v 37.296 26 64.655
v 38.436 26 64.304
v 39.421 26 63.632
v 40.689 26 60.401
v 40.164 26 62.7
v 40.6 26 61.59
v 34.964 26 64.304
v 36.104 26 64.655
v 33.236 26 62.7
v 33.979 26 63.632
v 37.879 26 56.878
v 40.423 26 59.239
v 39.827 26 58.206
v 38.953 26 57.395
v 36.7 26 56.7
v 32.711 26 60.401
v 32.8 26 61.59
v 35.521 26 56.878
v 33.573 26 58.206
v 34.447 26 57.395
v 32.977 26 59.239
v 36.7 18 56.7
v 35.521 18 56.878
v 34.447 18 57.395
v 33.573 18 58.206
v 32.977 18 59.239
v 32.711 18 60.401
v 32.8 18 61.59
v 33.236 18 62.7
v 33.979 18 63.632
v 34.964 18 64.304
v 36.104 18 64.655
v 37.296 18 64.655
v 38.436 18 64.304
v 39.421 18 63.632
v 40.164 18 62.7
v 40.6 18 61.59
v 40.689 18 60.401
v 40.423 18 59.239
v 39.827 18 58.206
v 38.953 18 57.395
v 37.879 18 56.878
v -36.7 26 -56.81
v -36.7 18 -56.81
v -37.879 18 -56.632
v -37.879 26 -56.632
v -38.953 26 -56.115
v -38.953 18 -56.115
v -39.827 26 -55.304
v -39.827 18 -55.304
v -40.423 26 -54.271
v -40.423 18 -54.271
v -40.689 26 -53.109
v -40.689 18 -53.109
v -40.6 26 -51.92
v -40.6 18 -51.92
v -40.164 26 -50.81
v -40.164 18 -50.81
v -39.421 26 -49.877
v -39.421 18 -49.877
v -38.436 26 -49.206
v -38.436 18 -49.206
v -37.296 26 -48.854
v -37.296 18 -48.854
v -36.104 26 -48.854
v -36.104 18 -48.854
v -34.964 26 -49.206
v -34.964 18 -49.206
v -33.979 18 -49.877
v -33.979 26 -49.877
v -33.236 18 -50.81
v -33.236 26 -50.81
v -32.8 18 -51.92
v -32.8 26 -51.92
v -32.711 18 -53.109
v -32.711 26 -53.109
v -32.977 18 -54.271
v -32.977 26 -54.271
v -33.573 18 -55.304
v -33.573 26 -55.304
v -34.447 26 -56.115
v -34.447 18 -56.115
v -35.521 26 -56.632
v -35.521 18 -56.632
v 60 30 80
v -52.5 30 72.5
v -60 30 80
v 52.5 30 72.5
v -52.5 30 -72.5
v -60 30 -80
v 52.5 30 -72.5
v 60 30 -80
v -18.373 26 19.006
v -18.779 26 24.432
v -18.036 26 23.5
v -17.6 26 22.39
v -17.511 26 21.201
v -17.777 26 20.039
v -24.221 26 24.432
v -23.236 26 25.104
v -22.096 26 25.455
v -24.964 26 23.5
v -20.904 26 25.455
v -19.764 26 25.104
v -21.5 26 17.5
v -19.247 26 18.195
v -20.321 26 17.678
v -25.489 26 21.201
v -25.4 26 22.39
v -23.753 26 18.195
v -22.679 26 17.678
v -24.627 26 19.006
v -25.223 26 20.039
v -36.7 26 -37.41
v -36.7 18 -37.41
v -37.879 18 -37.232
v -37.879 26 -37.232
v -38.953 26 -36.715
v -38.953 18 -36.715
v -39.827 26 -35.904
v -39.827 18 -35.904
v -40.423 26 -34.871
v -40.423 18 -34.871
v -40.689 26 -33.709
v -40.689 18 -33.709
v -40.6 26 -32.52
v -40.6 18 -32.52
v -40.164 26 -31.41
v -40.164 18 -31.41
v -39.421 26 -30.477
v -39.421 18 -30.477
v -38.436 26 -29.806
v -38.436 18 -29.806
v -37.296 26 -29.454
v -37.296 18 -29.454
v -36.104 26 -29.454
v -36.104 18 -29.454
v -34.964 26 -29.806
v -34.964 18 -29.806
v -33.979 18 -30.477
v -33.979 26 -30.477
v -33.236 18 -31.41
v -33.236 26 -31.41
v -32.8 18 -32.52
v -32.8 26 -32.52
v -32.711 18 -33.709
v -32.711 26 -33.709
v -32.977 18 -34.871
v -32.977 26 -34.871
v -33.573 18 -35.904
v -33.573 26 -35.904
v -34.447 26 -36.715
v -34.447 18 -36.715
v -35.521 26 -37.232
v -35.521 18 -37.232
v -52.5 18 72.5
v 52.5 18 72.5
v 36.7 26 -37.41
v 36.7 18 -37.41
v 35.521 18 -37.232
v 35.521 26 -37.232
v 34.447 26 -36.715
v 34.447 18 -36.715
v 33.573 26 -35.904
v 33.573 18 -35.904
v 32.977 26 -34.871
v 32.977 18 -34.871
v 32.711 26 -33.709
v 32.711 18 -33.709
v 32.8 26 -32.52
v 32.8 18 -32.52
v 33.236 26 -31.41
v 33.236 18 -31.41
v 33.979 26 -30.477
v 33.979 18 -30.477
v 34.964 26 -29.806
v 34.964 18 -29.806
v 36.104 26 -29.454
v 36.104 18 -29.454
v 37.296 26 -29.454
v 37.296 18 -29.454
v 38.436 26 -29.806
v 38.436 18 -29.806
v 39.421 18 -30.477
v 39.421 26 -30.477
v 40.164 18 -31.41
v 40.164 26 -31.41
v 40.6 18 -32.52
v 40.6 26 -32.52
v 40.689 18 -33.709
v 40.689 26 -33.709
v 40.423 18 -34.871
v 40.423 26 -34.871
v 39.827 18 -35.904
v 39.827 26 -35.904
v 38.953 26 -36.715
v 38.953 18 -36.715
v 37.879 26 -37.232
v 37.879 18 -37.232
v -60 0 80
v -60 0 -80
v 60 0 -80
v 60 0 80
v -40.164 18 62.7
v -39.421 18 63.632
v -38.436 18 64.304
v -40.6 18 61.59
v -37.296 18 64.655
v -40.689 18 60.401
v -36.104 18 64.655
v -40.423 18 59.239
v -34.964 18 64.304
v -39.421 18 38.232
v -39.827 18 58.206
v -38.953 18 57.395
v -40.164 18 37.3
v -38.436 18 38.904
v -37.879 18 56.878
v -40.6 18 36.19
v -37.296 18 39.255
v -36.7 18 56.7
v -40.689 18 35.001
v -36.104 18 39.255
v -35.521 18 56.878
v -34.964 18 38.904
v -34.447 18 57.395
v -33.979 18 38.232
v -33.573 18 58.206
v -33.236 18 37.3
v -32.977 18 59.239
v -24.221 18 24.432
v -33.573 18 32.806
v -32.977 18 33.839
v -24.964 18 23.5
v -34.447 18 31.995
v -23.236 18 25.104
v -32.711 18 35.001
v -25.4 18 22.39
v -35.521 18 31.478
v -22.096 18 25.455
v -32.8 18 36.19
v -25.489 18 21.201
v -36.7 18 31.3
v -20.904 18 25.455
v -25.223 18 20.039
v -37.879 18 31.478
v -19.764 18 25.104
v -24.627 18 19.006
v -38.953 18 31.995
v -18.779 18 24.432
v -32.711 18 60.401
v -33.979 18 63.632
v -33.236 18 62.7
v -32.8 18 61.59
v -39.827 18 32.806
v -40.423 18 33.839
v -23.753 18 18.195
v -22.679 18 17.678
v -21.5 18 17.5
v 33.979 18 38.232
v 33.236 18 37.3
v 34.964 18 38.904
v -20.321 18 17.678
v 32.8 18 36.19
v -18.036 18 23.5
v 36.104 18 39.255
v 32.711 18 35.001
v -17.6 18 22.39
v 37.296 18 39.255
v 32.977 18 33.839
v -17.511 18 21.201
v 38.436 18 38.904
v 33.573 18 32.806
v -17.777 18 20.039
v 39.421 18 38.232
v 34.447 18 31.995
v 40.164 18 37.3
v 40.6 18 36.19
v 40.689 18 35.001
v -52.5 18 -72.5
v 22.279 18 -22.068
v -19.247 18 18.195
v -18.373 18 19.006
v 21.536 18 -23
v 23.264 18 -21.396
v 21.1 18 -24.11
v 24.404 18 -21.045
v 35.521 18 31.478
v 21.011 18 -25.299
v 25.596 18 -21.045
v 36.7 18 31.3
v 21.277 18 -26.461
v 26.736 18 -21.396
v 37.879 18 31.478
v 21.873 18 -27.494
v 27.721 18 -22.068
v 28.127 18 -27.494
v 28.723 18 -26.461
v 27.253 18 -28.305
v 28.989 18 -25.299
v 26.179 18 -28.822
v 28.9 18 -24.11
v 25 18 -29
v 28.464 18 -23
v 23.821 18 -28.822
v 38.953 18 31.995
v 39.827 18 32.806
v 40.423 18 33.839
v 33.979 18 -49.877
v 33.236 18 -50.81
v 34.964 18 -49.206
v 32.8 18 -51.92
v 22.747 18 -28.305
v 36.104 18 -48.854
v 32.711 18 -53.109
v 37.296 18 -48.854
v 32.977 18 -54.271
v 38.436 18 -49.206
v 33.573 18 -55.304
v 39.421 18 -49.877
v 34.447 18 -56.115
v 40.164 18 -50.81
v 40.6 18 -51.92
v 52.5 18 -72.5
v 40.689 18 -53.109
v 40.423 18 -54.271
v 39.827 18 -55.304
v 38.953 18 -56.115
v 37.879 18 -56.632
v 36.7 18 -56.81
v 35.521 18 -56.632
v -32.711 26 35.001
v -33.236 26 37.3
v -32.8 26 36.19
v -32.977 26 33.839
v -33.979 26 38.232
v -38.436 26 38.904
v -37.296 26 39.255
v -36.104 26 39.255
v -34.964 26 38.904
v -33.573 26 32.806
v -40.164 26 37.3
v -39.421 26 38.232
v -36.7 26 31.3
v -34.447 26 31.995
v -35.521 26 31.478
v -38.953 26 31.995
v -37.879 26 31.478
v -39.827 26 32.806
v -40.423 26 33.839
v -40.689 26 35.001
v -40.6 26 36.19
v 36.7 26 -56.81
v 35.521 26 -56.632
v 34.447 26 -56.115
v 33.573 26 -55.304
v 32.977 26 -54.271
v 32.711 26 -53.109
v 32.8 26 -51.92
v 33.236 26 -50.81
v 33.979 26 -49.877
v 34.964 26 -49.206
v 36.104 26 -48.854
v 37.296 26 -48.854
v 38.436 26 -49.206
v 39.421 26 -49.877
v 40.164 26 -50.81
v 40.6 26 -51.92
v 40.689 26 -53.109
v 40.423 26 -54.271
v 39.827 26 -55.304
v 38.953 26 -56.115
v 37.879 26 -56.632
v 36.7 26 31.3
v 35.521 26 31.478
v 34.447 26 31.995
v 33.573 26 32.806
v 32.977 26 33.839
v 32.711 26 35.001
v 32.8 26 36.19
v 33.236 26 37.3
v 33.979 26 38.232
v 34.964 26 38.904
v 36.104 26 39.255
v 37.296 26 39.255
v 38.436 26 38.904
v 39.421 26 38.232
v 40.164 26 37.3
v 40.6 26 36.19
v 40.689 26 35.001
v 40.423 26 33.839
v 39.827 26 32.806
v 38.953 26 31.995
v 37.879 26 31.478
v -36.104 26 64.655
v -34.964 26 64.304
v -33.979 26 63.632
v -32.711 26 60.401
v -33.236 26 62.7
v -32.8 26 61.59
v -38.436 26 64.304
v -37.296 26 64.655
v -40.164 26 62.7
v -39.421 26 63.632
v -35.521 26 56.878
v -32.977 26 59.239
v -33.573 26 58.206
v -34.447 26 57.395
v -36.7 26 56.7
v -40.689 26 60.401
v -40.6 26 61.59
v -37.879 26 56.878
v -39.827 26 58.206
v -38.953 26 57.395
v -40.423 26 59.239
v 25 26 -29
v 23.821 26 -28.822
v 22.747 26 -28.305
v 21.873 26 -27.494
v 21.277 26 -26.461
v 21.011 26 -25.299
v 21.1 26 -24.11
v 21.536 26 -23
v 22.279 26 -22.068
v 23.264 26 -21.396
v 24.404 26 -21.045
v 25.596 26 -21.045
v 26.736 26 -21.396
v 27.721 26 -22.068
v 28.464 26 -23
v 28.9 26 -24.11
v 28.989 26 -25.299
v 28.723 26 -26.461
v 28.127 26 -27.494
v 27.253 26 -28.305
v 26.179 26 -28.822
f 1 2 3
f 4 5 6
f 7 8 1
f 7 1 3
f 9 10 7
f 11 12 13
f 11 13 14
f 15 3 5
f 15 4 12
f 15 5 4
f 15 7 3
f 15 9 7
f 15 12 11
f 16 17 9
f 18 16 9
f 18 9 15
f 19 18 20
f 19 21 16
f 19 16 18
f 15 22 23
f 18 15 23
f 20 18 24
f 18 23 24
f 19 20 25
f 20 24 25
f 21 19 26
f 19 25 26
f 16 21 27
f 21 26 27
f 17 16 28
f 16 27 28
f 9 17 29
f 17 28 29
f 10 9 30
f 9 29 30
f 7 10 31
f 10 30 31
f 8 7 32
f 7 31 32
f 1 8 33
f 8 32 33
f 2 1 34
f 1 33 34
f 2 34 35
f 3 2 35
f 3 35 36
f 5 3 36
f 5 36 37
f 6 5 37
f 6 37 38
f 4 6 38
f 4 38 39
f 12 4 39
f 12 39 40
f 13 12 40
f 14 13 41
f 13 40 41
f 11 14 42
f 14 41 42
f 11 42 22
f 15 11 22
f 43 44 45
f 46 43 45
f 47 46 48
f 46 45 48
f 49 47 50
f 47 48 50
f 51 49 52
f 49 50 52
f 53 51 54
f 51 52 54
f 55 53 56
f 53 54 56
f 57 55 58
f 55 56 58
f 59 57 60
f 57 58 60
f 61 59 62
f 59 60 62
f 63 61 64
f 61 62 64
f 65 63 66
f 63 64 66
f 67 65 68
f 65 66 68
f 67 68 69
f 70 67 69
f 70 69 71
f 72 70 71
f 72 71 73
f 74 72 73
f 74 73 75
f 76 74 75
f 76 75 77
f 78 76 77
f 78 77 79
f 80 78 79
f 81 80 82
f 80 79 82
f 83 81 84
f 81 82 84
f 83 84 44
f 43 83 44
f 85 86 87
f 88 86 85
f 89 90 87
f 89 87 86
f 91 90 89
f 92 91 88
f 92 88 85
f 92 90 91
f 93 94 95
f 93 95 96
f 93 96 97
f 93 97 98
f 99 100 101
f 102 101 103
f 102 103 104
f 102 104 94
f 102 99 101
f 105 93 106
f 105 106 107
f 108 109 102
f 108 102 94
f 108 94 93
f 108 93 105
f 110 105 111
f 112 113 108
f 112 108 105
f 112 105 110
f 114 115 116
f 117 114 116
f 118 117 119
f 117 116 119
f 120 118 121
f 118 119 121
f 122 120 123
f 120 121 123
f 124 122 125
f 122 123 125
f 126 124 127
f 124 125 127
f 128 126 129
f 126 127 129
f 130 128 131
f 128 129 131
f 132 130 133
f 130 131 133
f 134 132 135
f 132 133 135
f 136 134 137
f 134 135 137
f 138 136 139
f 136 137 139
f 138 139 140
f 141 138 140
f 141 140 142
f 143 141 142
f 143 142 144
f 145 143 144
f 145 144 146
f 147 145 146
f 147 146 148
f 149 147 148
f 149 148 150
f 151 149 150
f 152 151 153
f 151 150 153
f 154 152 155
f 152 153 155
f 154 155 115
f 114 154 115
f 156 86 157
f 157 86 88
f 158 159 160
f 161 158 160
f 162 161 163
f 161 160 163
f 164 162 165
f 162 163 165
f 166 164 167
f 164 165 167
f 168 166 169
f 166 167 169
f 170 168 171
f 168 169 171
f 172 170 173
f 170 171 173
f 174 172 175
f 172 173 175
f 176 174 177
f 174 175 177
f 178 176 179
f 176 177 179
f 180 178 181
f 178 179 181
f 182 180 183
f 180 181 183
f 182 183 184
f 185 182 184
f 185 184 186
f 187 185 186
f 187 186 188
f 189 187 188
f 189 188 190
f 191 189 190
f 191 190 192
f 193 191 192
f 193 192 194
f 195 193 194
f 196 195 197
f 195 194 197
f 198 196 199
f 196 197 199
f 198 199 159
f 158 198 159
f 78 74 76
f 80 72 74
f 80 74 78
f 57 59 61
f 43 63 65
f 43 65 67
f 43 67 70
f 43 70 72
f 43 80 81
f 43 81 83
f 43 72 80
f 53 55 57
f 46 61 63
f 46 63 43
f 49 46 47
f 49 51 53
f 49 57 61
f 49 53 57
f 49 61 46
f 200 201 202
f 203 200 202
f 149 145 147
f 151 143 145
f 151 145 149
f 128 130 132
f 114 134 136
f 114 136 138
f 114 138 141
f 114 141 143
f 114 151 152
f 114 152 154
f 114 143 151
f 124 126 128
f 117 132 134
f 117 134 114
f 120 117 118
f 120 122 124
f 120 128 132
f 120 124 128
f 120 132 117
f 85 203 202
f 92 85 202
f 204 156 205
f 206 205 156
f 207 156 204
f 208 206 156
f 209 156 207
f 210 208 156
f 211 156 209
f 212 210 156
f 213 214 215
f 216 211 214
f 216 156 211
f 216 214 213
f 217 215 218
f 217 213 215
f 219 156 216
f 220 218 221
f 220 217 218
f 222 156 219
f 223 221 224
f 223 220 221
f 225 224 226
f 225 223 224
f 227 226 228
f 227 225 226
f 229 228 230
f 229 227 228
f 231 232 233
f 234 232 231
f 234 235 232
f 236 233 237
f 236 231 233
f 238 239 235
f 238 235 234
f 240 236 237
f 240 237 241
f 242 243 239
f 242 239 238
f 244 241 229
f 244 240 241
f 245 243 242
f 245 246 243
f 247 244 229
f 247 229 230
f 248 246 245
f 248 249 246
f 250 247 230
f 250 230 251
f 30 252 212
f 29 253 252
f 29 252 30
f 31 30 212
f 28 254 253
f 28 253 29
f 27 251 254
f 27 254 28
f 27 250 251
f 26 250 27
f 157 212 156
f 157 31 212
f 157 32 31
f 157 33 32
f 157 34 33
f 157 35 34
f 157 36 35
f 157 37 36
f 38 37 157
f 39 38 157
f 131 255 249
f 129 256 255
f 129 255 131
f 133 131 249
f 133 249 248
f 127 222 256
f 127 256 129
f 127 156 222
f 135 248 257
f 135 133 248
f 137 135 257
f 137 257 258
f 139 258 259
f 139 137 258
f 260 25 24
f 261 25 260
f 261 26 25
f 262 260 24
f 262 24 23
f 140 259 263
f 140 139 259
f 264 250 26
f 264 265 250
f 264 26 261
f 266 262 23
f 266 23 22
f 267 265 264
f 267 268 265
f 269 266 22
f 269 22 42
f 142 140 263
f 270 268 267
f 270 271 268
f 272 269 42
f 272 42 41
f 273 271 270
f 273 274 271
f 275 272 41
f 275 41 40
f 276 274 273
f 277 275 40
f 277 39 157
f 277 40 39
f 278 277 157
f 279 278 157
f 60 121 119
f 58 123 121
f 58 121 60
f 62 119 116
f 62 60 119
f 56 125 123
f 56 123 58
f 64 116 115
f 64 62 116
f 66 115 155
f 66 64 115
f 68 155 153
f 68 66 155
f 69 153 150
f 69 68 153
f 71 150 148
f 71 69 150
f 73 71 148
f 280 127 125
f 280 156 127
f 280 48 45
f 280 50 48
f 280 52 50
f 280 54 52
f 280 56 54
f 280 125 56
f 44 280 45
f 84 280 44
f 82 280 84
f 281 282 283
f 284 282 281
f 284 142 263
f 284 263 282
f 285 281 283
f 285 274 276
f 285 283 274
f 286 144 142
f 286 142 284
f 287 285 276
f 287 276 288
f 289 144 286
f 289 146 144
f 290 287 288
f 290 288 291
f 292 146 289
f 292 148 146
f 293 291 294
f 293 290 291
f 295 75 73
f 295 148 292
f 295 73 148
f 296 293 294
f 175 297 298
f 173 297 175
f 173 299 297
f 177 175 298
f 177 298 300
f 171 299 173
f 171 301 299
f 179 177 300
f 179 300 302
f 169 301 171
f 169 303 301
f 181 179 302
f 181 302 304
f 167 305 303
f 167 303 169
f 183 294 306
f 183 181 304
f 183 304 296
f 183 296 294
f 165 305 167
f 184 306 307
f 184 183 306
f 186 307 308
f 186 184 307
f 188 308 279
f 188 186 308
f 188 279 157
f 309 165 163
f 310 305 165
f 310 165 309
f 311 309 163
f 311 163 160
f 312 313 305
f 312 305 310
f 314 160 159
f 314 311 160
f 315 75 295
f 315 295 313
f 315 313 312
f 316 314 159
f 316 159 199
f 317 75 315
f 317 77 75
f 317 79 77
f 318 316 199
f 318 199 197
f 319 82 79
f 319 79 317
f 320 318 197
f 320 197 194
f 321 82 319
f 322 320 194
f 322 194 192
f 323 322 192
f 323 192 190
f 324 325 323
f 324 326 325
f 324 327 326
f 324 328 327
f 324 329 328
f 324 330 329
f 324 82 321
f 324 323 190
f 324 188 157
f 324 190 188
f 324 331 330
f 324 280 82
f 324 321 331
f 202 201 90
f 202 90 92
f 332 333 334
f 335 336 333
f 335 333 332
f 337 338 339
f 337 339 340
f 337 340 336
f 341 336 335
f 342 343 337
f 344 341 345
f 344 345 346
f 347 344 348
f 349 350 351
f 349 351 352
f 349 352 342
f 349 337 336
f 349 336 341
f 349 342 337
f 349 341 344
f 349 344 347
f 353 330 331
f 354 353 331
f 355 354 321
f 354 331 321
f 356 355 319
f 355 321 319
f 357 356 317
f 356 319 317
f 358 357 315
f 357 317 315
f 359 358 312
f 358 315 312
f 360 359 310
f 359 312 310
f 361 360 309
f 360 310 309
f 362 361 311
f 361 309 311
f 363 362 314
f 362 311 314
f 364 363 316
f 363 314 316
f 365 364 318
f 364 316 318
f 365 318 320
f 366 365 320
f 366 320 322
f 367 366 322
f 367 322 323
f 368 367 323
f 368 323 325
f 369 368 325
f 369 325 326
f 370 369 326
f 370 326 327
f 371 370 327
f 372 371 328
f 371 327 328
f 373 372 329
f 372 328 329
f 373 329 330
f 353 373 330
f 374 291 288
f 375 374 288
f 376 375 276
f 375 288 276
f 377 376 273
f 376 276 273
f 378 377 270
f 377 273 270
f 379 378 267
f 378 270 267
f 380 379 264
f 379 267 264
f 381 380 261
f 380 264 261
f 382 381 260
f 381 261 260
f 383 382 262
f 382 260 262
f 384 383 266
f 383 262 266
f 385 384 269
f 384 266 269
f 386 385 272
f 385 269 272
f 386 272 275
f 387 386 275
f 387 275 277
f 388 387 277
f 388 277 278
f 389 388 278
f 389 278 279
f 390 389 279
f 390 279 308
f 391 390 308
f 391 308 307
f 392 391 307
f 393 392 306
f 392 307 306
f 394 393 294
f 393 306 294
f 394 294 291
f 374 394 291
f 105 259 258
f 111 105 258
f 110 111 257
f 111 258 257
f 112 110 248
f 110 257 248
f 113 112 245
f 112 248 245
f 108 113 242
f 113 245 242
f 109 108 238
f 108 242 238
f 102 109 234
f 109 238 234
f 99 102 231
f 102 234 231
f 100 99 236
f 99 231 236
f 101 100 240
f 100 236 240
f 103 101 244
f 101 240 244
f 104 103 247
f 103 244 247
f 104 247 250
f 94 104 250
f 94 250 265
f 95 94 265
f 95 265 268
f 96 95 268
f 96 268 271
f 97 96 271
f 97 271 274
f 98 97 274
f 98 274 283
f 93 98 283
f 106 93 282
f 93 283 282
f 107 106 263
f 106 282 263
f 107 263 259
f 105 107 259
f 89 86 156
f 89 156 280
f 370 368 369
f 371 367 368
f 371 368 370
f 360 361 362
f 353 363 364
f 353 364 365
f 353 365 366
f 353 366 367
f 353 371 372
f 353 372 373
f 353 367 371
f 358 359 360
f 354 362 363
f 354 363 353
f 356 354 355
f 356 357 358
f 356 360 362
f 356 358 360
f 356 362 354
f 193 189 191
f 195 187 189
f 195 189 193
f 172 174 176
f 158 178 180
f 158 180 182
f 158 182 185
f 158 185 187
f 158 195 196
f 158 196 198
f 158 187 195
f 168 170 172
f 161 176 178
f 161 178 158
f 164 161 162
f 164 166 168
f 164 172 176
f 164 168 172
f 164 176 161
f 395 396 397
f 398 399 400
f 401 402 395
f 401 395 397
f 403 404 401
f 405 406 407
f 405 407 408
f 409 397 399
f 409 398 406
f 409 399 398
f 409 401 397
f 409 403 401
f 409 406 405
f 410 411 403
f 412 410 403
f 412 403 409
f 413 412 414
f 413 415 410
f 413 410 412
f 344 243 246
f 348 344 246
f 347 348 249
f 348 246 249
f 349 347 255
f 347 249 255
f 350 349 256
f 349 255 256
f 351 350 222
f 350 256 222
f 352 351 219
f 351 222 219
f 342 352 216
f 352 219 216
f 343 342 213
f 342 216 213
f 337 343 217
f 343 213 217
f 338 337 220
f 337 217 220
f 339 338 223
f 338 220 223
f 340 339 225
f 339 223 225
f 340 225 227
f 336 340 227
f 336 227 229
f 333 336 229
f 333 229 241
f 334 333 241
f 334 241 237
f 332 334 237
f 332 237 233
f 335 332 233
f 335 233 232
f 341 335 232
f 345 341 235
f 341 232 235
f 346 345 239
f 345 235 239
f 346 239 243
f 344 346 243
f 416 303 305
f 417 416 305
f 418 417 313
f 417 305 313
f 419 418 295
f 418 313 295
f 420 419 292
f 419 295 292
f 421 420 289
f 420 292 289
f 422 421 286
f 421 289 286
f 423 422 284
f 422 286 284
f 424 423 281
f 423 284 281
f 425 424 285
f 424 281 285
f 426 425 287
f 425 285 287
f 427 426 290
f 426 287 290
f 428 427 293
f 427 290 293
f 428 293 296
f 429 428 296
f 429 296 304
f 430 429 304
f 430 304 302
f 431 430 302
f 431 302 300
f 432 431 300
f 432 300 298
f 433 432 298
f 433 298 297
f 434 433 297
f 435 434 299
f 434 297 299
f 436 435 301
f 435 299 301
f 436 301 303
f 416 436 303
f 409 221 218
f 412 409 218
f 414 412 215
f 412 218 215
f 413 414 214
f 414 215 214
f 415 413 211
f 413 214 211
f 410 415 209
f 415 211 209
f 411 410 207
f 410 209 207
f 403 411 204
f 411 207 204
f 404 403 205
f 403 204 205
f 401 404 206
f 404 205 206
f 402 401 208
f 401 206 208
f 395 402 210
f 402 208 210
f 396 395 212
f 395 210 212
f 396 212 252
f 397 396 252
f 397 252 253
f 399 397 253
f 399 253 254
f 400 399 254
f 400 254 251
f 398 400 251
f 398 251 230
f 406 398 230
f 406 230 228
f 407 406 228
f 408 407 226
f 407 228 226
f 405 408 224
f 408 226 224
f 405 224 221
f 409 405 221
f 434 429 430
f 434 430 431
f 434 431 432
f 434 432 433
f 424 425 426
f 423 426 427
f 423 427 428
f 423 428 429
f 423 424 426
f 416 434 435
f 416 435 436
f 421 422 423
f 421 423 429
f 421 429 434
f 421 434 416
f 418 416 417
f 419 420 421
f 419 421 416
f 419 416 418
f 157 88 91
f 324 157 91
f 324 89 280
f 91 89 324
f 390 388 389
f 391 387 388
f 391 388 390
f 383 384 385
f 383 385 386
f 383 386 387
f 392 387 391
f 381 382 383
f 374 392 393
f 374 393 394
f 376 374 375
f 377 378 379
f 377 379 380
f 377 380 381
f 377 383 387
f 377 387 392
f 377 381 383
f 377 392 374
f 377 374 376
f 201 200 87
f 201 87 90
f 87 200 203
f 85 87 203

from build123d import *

# Parameters (mm, degrees)
SKETCH1_W           = 120
SKETCH1_H           = 160
BOSS_EXTRUDE1_DEPTH = 30
SKETCH2_W           = 105
SKETCH2_H           = 145
CUT_EXTRUDE1_DEPTH  = 12
SKETCH3_R           = 4
BOSS_EXTRUDE2_DEPTH = 8


with BuildPart() as part:
    # Sketch1 → Boss-Extrude1 (new body)
    with BuildSketch(Plane(origin=(0, 0, 0), x_dir=(1, 0, 0), z_dir=(0, 1, 0))):
        Rectangle(SKETCH1_W, SKETCH1_H)
    extrude(amount=BOSS_EXTRUDE1_DEPTH)

    # Sketch2 → Cut-Extrude1 (cut)
    with BuildSketch(Plane(origin=(0, 30, 0), x_dir=(1, 0, 0), z_dir=(0, 1, 0))):
        Rectangle(SKETCH2_W, SKETCH2_H)
    extrude(amount=-CUT_EXTRUDE1_DEPTH, mode=Mode.SUBTRACT)

    # Sketch3 → Boss-Extrude2 (add)
    with BuildSketch(Plane(origin=(0, 18, 0), x_dir=(1, 0, 0), z_dir=(0, 1, 0))):
        with Locations(Location((-21.5, -21.5, 0), (0, 0, 90))):
            Circle(SKETCH3_R)
        with Locations(Location((25, 25, 0), (0, 0, 90))):
            Circle(SKETCH3_R)
        with Locations(Location((-36.7, -35.3, 0), (0, 0, 90))):
            Circle(SKETCH3_R)
        with Locations(Location((36.7, -35.3, 0), (0, 0, 90))):
            Circle(SKETCH3_R)
        with Locations(Location((36.7, -60.7, 0), (0, 0, 90))):
            Circle(SKETCH3_R)
        with Locations(Location((-36.7, -60.7, 0), (0, 0, 90))):
            Circle(SKETCH3_R)
        with Locations(Location((36.7, 33.409623616, 0), (0, 0, 90))):
            Circle(SKETCH3_R)
        with Locations(Location((-36.7, 33.409623616, 0), (0, 0, 90))):
            Circle(SKETCH3_R)
        with Locations(Location((-36.7, 52.809623616, 0), (0, 0, 90))):
            Circle(SKETCH3_R)
        with Locations(Location((36.7, 52.809623616, 0), (0, 0, 90))):
            Circle(SKETCH3_R)
    extrude(amount=BOSS_EXTRUDE2_DEPTH)


solid = part.part
